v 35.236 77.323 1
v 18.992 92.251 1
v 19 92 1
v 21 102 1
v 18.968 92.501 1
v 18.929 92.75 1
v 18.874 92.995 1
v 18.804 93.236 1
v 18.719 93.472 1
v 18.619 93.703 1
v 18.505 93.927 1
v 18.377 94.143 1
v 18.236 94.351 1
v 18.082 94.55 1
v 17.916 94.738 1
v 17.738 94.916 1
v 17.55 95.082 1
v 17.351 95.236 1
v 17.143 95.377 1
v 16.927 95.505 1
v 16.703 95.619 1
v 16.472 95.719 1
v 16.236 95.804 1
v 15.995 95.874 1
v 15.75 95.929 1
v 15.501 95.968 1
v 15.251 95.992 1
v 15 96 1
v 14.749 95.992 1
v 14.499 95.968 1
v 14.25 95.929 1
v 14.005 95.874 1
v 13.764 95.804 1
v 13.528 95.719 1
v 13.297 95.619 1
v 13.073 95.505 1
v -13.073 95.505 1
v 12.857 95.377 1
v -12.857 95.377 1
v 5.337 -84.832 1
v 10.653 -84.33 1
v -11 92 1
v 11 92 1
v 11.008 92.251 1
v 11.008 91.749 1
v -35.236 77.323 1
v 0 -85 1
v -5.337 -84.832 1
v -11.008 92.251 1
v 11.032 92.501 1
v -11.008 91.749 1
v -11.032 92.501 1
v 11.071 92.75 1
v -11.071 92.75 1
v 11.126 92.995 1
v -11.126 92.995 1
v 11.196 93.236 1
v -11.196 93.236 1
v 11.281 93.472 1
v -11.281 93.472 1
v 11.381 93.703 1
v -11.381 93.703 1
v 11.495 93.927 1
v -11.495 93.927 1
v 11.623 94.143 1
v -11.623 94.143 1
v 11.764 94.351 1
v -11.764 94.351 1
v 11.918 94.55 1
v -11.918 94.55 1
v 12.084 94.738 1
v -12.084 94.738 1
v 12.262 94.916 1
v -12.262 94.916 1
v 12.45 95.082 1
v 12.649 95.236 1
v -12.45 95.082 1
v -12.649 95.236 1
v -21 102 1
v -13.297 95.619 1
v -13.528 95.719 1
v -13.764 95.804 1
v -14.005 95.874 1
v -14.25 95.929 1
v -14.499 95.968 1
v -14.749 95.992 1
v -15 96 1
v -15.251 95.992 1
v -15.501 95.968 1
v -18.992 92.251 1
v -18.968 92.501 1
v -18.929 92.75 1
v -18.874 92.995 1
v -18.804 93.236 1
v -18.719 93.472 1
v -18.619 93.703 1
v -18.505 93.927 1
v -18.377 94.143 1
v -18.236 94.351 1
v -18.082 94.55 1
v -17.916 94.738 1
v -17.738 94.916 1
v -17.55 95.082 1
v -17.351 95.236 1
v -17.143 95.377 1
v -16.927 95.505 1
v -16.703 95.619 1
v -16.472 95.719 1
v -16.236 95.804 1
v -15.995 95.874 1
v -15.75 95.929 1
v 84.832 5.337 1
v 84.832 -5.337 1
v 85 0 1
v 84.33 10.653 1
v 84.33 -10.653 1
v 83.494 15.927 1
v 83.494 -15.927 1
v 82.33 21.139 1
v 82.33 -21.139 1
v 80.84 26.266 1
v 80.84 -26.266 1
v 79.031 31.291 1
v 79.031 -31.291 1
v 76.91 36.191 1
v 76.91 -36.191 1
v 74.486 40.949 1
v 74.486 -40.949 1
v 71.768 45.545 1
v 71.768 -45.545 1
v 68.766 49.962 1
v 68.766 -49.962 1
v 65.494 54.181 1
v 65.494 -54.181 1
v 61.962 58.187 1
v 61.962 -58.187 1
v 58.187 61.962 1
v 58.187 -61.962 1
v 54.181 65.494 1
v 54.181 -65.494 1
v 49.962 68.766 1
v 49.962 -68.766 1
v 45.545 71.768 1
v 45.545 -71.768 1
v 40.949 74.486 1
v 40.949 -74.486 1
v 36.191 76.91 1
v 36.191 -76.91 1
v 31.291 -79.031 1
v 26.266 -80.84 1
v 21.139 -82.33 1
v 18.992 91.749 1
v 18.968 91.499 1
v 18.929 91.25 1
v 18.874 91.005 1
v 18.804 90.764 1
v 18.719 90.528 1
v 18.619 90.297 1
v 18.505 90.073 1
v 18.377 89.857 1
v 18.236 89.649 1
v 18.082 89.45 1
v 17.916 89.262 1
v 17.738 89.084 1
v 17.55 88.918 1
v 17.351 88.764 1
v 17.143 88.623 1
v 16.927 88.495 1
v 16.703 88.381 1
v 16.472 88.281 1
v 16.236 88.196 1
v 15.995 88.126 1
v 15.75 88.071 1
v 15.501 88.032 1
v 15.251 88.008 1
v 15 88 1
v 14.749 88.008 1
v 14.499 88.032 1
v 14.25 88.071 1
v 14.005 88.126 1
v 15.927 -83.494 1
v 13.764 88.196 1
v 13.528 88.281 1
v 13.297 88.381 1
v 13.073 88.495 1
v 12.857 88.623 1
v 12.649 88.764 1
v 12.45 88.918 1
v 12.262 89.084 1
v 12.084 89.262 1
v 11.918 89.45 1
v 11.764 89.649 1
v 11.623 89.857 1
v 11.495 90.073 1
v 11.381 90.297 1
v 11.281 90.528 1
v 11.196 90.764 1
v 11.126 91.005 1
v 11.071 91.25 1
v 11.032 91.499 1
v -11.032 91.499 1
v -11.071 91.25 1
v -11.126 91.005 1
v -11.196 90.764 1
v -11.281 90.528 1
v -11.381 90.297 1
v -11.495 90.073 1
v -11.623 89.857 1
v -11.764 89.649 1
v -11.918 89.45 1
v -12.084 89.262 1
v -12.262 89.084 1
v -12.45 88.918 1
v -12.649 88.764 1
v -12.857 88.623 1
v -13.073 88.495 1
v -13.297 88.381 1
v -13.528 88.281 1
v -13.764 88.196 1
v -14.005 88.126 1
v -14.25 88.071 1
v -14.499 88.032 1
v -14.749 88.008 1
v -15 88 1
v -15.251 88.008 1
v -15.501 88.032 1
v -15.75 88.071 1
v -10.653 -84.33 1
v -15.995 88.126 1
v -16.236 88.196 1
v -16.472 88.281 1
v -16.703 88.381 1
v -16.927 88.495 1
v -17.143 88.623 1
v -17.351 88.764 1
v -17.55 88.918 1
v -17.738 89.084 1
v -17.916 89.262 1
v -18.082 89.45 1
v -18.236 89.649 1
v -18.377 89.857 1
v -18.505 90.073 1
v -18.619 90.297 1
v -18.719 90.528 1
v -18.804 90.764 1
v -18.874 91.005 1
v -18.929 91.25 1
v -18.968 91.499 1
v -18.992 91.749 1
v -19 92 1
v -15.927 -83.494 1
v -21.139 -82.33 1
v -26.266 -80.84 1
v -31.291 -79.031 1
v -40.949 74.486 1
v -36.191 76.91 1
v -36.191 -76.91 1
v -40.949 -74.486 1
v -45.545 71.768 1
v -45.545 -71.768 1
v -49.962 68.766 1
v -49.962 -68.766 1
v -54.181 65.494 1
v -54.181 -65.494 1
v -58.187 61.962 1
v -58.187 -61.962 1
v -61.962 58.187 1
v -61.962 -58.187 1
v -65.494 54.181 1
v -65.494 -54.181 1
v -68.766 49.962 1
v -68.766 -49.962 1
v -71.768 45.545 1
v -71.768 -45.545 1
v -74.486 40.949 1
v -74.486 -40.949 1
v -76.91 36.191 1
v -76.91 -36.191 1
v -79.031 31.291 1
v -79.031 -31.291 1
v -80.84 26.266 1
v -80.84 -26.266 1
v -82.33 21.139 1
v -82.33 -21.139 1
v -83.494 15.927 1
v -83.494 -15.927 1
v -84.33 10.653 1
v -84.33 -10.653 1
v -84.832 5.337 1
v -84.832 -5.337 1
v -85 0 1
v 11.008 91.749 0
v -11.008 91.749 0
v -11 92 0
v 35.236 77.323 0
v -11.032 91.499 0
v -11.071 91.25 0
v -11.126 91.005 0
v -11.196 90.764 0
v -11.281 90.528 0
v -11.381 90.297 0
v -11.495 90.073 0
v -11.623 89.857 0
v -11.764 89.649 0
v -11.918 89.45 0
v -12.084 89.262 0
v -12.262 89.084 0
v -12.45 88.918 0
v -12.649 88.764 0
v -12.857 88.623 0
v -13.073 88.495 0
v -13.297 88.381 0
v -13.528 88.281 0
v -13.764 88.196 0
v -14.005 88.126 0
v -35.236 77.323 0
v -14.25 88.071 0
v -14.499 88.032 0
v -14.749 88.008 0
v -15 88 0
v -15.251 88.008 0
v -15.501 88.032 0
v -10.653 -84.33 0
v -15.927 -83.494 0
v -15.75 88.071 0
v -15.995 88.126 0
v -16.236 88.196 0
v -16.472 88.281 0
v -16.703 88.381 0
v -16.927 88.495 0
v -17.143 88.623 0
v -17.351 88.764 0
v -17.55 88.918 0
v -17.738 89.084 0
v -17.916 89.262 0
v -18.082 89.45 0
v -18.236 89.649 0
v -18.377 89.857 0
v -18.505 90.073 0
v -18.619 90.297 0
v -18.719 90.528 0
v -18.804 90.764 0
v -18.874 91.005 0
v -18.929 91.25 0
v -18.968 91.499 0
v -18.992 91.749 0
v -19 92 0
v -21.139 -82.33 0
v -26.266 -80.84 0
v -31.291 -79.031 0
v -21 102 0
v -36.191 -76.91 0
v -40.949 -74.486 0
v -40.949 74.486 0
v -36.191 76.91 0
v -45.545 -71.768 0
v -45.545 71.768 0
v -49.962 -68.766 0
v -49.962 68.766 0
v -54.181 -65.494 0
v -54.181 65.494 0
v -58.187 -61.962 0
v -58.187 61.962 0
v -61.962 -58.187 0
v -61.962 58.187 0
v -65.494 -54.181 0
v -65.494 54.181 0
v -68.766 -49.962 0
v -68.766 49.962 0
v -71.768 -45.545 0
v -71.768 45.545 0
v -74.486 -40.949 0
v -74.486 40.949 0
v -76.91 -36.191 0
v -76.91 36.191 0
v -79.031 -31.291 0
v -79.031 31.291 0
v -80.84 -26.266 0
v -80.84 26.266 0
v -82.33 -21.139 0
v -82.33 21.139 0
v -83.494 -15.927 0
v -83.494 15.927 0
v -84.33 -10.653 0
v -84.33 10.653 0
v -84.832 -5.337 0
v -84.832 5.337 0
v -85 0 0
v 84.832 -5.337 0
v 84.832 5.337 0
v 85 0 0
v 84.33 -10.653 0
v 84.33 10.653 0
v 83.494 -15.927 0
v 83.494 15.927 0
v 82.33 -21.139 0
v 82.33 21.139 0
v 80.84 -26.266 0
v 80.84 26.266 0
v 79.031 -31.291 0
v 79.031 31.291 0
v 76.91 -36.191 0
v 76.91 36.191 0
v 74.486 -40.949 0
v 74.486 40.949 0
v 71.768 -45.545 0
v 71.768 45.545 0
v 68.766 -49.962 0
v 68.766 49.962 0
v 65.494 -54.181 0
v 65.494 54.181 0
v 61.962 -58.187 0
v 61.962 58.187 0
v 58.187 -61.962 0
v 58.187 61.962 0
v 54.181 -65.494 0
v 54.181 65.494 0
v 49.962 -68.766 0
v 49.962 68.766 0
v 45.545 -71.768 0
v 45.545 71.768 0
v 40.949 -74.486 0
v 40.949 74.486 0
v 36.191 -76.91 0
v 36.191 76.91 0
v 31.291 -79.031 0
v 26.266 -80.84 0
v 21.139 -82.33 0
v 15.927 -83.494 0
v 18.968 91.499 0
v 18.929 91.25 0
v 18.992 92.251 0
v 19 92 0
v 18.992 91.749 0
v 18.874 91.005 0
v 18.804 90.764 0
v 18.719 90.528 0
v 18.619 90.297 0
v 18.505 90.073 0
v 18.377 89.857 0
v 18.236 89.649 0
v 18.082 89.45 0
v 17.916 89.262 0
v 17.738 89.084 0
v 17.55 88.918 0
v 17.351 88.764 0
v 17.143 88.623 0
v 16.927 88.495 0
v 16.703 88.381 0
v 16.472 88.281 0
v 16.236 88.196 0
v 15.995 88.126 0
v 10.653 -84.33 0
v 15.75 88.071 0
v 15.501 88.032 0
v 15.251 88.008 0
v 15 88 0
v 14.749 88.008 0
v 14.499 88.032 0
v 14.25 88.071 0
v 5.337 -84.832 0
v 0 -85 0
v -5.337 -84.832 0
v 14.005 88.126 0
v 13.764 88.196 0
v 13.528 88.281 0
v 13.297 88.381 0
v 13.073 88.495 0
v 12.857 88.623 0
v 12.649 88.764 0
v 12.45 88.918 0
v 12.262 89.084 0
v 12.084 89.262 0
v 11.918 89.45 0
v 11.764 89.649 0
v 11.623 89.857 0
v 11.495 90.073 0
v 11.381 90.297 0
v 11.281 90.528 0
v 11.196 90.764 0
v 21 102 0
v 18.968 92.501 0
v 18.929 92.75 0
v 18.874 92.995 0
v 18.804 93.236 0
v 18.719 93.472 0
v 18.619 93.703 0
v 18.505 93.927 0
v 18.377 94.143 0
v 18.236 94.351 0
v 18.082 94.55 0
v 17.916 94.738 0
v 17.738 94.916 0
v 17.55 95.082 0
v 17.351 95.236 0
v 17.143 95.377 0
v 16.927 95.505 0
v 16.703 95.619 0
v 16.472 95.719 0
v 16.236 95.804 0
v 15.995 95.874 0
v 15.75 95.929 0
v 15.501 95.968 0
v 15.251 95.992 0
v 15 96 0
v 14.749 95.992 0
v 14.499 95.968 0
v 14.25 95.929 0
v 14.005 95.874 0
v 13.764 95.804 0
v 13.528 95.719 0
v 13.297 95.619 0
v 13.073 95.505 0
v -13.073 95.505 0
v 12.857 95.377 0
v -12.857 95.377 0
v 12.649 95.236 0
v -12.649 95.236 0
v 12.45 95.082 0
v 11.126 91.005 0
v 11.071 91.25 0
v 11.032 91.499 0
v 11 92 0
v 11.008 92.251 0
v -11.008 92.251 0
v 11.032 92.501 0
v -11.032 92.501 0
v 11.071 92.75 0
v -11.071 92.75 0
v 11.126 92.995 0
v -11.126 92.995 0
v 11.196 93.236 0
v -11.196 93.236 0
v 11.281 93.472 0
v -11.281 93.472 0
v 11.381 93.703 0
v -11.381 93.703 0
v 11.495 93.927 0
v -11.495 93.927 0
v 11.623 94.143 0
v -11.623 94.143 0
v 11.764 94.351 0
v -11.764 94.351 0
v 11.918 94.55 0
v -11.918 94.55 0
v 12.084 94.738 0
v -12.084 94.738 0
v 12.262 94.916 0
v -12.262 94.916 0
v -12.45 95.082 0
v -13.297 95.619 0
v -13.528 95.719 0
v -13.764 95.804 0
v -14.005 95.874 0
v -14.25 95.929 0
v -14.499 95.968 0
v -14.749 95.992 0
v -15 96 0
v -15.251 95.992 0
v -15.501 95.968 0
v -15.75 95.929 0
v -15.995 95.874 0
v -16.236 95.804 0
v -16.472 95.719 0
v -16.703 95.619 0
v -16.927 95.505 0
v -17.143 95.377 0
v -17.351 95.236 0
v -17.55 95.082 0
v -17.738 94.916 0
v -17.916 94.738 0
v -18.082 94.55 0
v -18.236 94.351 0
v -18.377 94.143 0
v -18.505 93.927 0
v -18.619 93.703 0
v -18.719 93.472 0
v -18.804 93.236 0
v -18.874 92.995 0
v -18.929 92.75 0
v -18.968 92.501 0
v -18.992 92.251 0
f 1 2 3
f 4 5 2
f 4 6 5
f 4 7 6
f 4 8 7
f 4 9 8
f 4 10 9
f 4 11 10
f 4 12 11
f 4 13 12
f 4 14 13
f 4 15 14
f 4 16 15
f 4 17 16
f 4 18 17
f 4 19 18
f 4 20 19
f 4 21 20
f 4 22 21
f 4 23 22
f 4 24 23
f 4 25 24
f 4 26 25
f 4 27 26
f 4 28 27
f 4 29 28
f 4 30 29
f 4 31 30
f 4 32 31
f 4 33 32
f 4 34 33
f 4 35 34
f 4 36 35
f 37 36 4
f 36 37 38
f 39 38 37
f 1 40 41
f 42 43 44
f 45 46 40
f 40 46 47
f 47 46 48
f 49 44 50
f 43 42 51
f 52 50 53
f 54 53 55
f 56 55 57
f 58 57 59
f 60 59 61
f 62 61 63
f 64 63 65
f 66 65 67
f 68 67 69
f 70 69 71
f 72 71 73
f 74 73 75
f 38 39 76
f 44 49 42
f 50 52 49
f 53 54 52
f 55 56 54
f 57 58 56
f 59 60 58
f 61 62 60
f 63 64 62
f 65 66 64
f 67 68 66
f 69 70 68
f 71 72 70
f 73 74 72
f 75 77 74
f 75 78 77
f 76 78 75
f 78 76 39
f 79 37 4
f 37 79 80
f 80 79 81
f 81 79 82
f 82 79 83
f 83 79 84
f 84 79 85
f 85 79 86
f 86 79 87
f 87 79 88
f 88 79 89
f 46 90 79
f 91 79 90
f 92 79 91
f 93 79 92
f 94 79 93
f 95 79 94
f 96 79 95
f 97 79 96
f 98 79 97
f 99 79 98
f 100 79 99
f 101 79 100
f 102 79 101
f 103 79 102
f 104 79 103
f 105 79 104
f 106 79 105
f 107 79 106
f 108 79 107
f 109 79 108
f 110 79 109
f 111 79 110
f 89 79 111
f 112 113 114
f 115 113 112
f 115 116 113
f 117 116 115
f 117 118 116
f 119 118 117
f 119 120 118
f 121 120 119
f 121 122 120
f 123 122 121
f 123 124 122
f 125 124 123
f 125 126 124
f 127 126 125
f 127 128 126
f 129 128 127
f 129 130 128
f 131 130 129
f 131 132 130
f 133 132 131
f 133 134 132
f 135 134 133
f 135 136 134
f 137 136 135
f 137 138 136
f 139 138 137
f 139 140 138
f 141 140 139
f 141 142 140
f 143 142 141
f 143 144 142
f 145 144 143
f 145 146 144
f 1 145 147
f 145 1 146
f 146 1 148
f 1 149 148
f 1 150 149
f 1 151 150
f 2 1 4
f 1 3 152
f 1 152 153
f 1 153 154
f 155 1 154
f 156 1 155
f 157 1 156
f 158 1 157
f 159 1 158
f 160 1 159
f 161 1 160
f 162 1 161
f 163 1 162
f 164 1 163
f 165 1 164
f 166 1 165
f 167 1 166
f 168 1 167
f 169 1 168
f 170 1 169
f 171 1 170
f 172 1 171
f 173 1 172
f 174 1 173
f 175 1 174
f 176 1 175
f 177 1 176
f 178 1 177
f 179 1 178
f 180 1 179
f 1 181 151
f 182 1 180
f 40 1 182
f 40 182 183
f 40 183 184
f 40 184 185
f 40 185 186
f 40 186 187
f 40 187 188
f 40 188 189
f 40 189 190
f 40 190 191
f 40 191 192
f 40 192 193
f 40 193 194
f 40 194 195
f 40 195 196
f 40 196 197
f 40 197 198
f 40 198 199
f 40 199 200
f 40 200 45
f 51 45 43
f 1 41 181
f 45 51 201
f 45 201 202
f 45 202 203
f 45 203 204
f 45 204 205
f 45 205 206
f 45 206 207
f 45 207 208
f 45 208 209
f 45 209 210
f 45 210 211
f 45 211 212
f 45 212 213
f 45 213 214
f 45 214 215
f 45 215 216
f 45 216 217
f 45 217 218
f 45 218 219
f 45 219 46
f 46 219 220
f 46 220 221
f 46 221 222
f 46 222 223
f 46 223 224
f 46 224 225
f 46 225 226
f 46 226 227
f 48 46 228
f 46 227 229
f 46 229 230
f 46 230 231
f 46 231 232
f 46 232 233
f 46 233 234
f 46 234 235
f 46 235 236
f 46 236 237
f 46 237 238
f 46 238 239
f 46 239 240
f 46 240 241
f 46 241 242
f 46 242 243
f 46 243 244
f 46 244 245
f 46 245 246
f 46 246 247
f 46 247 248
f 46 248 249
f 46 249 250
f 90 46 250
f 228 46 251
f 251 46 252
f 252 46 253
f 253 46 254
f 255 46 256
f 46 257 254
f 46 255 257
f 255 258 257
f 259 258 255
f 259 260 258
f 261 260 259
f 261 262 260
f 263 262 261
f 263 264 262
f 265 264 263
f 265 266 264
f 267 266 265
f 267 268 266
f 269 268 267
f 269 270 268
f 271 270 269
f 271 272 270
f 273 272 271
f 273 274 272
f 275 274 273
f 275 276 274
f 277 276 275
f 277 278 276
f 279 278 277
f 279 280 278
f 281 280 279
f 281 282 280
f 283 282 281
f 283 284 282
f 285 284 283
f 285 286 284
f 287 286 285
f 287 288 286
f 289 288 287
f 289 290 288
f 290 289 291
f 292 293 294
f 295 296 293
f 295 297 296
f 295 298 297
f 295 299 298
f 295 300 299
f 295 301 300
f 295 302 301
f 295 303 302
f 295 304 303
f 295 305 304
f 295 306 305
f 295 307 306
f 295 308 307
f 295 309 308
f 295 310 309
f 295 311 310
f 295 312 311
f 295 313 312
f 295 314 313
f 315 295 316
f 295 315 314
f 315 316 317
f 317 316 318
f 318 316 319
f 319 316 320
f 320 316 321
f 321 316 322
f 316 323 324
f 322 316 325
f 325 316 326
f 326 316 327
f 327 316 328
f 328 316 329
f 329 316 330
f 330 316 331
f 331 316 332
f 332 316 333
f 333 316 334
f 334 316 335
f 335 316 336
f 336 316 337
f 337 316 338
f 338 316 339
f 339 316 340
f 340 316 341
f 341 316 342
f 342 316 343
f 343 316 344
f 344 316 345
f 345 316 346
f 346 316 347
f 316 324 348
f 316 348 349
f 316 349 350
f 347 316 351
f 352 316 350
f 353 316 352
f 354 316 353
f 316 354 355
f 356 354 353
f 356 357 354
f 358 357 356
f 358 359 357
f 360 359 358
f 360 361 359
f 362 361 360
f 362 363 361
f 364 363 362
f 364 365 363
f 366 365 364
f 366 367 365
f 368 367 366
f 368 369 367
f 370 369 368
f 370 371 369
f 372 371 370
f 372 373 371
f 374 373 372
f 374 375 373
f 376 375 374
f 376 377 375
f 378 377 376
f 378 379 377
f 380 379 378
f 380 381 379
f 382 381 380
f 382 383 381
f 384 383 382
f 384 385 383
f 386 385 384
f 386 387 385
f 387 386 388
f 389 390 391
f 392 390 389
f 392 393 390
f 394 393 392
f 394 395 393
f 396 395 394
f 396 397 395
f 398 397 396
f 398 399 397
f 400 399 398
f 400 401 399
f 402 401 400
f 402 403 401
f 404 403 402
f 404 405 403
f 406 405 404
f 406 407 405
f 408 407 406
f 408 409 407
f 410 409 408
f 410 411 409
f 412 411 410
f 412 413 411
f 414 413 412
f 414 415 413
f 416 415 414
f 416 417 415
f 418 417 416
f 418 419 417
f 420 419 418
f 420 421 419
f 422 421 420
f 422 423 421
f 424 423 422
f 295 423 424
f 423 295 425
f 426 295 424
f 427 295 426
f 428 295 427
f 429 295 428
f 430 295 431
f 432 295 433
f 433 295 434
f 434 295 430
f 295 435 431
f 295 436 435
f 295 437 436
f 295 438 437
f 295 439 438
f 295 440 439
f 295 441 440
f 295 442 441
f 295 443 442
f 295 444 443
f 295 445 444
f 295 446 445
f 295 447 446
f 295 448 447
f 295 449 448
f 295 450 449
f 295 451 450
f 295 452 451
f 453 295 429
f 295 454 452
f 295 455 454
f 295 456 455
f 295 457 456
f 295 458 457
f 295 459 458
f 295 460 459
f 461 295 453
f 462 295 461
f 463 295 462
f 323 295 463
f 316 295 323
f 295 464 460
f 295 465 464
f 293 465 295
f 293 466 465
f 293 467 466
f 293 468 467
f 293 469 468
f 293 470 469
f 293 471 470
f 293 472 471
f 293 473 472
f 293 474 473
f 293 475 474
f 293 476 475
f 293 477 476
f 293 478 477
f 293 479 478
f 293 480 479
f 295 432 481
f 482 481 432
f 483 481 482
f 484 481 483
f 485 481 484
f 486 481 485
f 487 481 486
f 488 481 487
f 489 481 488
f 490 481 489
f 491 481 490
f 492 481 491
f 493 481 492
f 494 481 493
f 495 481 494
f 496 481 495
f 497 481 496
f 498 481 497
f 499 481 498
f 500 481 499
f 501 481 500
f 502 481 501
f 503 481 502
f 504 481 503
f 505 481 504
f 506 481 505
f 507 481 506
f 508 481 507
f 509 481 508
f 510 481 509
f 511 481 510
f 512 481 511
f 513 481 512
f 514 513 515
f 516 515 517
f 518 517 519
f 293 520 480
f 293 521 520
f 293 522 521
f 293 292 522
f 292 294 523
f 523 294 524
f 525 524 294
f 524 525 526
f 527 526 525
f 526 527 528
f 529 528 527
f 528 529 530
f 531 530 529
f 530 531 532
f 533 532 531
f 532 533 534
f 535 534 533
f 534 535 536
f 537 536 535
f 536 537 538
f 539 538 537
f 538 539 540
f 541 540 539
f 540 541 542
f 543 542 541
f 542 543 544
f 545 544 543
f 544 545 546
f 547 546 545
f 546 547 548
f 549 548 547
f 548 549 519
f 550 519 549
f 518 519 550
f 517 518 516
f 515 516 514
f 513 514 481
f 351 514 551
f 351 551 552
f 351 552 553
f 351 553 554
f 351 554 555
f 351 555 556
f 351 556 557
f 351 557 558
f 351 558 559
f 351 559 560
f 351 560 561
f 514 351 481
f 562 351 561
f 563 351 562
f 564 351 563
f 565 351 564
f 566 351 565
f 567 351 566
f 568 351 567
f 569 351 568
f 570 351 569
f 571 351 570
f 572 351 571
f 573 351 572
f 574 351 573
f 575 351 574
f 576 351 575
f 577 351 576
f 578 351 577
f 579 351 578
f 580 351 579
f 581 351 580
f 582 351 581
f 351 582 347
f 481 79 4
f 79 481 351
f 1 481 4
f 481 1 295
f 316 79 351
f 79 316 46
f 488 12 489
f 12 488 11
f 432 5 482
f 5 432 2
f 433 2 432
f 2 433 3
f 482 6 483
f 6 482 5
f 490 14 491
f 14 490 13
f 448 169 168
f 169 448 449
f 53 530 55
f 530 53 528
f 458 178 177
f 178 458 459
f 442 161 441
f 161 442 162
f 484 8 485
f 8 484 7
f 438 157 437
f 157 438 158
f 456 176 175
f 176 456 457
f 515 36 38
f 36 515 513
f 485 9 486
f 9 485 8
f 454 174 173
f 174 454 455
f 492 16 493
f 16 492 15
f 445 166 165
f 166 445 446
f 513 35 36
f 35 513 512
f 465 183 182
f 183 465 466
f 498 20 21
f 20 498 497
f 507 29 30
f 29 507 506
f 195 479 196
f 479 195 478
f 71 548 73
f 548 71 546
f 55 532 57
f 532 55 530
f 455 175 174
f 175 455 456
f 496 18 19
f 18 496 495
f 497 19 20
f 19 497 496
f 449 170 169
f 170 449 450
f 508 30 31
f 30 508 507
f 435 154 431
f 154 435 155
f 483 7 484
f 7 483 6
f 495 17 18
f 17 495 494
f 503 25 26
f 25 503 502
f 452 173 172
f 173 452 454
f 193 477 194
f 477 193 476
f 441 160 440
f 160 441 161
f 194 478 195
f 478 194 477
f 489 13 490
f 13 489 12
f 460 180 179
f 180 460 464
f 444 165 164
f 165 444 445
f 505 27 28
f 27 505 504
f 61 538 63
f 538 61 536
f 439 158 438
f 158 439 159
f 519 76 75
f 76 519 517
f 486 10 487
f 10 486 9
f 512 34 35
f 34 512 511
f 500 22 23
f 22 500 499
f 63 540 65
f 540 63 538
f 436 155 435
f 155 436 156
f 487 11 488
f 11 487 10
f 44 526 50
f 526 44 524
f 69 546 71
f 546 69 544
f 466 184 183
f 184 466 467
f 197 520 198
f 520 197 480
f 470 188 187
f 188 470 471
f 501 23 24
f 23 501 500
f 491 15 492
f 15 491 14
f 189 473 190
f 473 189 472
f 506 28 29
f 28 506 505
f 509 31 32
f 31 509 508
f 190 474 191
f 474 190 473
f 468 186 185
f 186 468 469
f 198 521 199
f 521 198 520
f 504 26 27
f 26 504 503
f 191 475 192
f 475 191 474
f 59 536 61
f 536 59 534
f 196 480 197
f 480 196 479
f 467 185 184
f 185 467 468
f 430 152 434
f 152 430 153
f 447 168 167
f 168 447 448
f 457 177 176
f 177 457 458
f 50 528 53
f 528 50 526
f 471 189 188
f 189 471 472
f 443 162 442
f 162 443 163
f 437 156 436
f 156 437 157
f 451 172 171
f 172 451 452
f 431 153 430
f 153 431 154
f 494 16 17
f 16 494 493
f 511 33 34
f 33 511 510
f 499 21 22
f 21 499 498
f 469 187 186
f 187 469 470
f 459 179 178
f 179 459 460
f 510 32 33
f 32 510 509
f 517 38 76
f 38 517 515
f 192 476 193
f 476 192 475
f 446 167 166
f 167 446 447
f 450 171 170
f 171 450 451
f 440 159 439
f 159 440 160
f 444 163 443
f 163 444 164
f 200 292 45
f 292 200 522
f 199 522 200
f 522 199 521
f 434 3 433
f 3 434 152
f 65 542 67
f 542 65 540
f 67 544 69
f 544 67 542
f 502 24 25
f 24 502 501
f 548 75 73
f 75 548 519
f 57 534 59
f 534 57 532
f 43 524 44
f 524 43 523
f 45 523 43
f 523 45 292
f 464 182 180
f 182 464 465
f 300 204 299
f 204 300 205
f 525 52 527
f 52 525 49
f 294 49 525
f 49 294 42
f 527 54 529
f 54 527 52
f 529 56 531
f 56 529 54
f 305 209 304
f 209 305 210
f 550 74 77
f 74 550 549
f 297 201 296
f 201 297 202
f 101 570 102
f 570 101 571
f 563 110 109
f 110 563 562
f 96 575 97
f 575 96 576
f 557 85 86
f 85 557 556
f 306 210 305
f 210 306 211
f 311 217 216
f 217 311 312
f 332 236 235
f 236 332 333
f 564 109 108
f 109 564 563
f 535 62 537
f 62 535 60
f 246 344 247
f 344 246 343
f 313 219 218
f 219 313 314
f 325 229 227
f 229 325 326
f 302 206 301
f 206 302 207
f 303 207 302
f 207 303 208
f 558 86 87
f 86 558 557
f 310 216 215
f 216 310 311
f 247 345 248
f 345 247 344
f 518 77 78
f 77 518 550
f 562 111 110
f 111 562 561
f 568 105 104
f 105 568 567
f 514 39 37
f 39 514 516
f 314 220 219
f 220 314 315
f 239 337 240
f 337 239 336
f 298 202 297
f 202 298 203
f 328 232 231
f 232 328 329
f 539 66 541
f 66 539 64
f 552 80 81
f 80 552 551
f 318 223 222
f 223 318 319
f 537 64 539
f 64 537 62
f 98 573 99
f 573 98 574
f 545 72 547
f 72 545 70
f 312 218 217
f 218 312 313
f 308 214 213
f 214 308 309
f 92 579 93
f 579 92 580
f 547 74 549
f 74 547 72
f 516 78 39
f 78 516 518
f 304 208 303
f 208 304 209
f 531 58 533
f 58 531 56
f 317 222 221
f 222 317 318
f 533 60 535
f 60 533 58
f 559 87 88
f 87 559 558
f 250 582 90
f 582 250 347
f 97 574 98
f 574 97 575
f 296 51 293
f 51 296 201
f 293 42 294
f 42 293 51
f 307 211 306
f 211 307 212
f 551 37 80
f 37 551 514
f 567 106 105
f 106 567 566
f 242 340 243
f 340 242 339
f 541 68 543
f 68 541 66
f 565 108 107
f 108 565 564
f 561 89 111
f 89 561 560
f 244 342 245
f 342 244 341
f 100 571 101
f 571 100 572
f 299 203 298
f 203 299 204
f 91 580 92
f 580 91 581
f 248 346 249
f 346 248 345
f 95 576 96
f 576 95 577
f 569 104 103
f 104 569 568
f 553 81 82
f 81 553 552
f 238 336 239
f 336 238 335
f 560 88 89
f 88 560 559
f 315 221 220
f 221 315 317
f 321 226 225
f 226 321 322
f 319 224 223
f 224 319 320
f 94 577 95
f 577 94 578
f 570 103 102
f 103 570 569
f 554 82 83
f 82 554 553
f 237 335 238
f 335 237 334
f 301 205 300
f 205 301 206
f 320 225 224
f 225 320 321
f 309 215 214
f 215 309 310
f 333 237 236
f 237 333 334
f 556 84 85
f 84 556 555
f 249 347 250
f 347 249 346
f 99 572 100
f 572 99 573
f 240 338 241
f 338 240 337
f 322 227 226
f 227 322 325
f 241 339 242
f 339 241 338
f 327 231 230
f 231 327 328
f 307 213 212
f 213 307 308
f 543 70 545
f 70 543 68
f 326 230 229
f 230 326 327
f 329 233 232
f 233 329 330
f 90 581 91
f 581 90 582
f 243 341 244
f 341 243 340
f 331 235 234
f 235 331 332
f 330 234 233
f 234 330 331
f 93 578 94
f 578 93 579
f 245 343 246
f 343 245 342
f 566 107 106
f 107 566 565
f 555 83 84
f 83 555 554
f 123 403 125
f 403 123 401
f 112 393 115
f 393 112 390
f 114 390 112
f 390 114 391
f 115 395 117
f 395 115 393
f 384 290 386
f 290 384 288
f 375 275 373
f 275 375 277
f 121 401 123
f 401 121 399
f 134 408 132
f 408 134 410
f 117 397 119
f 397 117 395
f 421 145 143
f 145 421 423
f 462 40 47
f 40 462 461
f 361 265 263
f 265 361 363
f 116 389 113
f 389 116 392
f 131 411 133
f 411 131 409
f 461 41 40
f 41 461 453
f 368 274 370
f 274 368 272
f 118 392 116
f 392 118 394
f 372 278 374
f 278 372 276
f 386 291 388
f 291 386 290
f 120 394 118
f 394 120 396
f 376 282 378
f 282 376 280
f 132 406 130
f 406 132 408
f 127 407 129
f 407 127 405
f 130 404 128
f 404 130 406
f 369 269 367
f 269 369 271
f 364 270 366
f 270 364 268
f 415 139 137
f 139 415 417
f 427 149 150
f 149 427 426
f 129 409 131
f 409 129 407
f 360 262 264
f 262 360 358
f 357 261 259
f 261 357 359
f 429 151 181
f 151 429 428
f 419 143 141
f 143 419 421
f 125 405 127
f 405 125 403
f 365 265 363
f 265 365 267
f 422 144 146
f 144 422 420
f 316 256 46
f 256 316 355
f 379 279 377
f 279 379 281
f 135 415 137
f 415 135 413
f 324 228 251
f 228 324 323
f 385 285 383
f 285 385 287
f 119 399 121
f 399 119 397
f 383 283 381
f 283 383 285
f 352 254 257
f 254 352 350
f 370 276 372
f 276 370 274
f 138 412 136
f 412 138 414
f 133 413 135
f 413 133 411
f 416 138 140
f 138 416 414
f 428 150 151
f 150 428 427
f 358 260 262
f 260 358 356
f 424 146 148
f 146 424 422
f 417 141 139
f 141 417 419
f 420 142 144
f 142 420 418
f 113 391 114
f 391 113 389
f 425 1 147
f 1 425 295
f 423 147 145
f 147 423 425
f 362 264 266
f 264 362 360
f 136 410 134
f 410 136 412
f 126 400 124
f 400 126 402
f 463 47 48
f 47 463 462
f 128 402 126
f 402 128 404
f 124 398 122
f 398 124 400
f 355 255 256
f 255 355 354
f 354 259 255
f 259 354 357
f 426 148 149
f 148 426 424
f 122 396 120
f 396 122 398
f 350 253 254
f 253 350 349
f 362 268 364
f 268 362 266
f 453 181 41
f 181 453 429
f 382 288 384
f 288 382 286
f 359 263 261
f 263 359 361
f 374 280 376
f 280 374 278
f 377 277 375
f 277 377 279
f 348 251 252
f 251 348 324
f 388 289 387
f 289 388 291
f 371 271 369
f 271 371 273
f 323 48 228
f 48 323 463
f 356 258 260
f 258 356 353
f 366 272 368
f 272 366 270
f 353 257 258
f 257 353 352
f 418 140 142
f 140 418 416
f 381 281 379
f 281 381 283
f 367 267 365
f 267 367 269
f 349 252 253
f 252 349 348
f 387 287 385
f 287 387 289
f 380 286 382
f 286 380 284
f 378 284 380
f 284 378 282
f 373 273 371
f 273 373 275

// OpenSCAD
echo(version=version());
// Increase the visual detail
$fn = 100;

module target() {
    cylinder(d=170, h=1); 
    
}

module hanger() {
    color("red")
    translate([-21, 82, 0])
    cube([42,20,1]);
    
    color("red")
    translate([21,76,0])
    rotate([0,0,0])
    linear_extrude(1)
    polygon([[0,0],[15,0],[0,26]]);
    
    color("red")
    translate([-21,76,0])
    rotate([0,0,90])
    linear_extrude(1)
    polygon([[0,0],[26,0],[0,15]]);

}
    
module hangerholes() {
    color("white")
    translate([15,92,-1])
    cylinder(d=8, h=3);
    
    color("white")
    translate([-15,92,-1])
    cylinder(d=8, h=3);
    
}

difference() {
   hanger();
   hangerholes();
    
}

target();
//hangerholes();
